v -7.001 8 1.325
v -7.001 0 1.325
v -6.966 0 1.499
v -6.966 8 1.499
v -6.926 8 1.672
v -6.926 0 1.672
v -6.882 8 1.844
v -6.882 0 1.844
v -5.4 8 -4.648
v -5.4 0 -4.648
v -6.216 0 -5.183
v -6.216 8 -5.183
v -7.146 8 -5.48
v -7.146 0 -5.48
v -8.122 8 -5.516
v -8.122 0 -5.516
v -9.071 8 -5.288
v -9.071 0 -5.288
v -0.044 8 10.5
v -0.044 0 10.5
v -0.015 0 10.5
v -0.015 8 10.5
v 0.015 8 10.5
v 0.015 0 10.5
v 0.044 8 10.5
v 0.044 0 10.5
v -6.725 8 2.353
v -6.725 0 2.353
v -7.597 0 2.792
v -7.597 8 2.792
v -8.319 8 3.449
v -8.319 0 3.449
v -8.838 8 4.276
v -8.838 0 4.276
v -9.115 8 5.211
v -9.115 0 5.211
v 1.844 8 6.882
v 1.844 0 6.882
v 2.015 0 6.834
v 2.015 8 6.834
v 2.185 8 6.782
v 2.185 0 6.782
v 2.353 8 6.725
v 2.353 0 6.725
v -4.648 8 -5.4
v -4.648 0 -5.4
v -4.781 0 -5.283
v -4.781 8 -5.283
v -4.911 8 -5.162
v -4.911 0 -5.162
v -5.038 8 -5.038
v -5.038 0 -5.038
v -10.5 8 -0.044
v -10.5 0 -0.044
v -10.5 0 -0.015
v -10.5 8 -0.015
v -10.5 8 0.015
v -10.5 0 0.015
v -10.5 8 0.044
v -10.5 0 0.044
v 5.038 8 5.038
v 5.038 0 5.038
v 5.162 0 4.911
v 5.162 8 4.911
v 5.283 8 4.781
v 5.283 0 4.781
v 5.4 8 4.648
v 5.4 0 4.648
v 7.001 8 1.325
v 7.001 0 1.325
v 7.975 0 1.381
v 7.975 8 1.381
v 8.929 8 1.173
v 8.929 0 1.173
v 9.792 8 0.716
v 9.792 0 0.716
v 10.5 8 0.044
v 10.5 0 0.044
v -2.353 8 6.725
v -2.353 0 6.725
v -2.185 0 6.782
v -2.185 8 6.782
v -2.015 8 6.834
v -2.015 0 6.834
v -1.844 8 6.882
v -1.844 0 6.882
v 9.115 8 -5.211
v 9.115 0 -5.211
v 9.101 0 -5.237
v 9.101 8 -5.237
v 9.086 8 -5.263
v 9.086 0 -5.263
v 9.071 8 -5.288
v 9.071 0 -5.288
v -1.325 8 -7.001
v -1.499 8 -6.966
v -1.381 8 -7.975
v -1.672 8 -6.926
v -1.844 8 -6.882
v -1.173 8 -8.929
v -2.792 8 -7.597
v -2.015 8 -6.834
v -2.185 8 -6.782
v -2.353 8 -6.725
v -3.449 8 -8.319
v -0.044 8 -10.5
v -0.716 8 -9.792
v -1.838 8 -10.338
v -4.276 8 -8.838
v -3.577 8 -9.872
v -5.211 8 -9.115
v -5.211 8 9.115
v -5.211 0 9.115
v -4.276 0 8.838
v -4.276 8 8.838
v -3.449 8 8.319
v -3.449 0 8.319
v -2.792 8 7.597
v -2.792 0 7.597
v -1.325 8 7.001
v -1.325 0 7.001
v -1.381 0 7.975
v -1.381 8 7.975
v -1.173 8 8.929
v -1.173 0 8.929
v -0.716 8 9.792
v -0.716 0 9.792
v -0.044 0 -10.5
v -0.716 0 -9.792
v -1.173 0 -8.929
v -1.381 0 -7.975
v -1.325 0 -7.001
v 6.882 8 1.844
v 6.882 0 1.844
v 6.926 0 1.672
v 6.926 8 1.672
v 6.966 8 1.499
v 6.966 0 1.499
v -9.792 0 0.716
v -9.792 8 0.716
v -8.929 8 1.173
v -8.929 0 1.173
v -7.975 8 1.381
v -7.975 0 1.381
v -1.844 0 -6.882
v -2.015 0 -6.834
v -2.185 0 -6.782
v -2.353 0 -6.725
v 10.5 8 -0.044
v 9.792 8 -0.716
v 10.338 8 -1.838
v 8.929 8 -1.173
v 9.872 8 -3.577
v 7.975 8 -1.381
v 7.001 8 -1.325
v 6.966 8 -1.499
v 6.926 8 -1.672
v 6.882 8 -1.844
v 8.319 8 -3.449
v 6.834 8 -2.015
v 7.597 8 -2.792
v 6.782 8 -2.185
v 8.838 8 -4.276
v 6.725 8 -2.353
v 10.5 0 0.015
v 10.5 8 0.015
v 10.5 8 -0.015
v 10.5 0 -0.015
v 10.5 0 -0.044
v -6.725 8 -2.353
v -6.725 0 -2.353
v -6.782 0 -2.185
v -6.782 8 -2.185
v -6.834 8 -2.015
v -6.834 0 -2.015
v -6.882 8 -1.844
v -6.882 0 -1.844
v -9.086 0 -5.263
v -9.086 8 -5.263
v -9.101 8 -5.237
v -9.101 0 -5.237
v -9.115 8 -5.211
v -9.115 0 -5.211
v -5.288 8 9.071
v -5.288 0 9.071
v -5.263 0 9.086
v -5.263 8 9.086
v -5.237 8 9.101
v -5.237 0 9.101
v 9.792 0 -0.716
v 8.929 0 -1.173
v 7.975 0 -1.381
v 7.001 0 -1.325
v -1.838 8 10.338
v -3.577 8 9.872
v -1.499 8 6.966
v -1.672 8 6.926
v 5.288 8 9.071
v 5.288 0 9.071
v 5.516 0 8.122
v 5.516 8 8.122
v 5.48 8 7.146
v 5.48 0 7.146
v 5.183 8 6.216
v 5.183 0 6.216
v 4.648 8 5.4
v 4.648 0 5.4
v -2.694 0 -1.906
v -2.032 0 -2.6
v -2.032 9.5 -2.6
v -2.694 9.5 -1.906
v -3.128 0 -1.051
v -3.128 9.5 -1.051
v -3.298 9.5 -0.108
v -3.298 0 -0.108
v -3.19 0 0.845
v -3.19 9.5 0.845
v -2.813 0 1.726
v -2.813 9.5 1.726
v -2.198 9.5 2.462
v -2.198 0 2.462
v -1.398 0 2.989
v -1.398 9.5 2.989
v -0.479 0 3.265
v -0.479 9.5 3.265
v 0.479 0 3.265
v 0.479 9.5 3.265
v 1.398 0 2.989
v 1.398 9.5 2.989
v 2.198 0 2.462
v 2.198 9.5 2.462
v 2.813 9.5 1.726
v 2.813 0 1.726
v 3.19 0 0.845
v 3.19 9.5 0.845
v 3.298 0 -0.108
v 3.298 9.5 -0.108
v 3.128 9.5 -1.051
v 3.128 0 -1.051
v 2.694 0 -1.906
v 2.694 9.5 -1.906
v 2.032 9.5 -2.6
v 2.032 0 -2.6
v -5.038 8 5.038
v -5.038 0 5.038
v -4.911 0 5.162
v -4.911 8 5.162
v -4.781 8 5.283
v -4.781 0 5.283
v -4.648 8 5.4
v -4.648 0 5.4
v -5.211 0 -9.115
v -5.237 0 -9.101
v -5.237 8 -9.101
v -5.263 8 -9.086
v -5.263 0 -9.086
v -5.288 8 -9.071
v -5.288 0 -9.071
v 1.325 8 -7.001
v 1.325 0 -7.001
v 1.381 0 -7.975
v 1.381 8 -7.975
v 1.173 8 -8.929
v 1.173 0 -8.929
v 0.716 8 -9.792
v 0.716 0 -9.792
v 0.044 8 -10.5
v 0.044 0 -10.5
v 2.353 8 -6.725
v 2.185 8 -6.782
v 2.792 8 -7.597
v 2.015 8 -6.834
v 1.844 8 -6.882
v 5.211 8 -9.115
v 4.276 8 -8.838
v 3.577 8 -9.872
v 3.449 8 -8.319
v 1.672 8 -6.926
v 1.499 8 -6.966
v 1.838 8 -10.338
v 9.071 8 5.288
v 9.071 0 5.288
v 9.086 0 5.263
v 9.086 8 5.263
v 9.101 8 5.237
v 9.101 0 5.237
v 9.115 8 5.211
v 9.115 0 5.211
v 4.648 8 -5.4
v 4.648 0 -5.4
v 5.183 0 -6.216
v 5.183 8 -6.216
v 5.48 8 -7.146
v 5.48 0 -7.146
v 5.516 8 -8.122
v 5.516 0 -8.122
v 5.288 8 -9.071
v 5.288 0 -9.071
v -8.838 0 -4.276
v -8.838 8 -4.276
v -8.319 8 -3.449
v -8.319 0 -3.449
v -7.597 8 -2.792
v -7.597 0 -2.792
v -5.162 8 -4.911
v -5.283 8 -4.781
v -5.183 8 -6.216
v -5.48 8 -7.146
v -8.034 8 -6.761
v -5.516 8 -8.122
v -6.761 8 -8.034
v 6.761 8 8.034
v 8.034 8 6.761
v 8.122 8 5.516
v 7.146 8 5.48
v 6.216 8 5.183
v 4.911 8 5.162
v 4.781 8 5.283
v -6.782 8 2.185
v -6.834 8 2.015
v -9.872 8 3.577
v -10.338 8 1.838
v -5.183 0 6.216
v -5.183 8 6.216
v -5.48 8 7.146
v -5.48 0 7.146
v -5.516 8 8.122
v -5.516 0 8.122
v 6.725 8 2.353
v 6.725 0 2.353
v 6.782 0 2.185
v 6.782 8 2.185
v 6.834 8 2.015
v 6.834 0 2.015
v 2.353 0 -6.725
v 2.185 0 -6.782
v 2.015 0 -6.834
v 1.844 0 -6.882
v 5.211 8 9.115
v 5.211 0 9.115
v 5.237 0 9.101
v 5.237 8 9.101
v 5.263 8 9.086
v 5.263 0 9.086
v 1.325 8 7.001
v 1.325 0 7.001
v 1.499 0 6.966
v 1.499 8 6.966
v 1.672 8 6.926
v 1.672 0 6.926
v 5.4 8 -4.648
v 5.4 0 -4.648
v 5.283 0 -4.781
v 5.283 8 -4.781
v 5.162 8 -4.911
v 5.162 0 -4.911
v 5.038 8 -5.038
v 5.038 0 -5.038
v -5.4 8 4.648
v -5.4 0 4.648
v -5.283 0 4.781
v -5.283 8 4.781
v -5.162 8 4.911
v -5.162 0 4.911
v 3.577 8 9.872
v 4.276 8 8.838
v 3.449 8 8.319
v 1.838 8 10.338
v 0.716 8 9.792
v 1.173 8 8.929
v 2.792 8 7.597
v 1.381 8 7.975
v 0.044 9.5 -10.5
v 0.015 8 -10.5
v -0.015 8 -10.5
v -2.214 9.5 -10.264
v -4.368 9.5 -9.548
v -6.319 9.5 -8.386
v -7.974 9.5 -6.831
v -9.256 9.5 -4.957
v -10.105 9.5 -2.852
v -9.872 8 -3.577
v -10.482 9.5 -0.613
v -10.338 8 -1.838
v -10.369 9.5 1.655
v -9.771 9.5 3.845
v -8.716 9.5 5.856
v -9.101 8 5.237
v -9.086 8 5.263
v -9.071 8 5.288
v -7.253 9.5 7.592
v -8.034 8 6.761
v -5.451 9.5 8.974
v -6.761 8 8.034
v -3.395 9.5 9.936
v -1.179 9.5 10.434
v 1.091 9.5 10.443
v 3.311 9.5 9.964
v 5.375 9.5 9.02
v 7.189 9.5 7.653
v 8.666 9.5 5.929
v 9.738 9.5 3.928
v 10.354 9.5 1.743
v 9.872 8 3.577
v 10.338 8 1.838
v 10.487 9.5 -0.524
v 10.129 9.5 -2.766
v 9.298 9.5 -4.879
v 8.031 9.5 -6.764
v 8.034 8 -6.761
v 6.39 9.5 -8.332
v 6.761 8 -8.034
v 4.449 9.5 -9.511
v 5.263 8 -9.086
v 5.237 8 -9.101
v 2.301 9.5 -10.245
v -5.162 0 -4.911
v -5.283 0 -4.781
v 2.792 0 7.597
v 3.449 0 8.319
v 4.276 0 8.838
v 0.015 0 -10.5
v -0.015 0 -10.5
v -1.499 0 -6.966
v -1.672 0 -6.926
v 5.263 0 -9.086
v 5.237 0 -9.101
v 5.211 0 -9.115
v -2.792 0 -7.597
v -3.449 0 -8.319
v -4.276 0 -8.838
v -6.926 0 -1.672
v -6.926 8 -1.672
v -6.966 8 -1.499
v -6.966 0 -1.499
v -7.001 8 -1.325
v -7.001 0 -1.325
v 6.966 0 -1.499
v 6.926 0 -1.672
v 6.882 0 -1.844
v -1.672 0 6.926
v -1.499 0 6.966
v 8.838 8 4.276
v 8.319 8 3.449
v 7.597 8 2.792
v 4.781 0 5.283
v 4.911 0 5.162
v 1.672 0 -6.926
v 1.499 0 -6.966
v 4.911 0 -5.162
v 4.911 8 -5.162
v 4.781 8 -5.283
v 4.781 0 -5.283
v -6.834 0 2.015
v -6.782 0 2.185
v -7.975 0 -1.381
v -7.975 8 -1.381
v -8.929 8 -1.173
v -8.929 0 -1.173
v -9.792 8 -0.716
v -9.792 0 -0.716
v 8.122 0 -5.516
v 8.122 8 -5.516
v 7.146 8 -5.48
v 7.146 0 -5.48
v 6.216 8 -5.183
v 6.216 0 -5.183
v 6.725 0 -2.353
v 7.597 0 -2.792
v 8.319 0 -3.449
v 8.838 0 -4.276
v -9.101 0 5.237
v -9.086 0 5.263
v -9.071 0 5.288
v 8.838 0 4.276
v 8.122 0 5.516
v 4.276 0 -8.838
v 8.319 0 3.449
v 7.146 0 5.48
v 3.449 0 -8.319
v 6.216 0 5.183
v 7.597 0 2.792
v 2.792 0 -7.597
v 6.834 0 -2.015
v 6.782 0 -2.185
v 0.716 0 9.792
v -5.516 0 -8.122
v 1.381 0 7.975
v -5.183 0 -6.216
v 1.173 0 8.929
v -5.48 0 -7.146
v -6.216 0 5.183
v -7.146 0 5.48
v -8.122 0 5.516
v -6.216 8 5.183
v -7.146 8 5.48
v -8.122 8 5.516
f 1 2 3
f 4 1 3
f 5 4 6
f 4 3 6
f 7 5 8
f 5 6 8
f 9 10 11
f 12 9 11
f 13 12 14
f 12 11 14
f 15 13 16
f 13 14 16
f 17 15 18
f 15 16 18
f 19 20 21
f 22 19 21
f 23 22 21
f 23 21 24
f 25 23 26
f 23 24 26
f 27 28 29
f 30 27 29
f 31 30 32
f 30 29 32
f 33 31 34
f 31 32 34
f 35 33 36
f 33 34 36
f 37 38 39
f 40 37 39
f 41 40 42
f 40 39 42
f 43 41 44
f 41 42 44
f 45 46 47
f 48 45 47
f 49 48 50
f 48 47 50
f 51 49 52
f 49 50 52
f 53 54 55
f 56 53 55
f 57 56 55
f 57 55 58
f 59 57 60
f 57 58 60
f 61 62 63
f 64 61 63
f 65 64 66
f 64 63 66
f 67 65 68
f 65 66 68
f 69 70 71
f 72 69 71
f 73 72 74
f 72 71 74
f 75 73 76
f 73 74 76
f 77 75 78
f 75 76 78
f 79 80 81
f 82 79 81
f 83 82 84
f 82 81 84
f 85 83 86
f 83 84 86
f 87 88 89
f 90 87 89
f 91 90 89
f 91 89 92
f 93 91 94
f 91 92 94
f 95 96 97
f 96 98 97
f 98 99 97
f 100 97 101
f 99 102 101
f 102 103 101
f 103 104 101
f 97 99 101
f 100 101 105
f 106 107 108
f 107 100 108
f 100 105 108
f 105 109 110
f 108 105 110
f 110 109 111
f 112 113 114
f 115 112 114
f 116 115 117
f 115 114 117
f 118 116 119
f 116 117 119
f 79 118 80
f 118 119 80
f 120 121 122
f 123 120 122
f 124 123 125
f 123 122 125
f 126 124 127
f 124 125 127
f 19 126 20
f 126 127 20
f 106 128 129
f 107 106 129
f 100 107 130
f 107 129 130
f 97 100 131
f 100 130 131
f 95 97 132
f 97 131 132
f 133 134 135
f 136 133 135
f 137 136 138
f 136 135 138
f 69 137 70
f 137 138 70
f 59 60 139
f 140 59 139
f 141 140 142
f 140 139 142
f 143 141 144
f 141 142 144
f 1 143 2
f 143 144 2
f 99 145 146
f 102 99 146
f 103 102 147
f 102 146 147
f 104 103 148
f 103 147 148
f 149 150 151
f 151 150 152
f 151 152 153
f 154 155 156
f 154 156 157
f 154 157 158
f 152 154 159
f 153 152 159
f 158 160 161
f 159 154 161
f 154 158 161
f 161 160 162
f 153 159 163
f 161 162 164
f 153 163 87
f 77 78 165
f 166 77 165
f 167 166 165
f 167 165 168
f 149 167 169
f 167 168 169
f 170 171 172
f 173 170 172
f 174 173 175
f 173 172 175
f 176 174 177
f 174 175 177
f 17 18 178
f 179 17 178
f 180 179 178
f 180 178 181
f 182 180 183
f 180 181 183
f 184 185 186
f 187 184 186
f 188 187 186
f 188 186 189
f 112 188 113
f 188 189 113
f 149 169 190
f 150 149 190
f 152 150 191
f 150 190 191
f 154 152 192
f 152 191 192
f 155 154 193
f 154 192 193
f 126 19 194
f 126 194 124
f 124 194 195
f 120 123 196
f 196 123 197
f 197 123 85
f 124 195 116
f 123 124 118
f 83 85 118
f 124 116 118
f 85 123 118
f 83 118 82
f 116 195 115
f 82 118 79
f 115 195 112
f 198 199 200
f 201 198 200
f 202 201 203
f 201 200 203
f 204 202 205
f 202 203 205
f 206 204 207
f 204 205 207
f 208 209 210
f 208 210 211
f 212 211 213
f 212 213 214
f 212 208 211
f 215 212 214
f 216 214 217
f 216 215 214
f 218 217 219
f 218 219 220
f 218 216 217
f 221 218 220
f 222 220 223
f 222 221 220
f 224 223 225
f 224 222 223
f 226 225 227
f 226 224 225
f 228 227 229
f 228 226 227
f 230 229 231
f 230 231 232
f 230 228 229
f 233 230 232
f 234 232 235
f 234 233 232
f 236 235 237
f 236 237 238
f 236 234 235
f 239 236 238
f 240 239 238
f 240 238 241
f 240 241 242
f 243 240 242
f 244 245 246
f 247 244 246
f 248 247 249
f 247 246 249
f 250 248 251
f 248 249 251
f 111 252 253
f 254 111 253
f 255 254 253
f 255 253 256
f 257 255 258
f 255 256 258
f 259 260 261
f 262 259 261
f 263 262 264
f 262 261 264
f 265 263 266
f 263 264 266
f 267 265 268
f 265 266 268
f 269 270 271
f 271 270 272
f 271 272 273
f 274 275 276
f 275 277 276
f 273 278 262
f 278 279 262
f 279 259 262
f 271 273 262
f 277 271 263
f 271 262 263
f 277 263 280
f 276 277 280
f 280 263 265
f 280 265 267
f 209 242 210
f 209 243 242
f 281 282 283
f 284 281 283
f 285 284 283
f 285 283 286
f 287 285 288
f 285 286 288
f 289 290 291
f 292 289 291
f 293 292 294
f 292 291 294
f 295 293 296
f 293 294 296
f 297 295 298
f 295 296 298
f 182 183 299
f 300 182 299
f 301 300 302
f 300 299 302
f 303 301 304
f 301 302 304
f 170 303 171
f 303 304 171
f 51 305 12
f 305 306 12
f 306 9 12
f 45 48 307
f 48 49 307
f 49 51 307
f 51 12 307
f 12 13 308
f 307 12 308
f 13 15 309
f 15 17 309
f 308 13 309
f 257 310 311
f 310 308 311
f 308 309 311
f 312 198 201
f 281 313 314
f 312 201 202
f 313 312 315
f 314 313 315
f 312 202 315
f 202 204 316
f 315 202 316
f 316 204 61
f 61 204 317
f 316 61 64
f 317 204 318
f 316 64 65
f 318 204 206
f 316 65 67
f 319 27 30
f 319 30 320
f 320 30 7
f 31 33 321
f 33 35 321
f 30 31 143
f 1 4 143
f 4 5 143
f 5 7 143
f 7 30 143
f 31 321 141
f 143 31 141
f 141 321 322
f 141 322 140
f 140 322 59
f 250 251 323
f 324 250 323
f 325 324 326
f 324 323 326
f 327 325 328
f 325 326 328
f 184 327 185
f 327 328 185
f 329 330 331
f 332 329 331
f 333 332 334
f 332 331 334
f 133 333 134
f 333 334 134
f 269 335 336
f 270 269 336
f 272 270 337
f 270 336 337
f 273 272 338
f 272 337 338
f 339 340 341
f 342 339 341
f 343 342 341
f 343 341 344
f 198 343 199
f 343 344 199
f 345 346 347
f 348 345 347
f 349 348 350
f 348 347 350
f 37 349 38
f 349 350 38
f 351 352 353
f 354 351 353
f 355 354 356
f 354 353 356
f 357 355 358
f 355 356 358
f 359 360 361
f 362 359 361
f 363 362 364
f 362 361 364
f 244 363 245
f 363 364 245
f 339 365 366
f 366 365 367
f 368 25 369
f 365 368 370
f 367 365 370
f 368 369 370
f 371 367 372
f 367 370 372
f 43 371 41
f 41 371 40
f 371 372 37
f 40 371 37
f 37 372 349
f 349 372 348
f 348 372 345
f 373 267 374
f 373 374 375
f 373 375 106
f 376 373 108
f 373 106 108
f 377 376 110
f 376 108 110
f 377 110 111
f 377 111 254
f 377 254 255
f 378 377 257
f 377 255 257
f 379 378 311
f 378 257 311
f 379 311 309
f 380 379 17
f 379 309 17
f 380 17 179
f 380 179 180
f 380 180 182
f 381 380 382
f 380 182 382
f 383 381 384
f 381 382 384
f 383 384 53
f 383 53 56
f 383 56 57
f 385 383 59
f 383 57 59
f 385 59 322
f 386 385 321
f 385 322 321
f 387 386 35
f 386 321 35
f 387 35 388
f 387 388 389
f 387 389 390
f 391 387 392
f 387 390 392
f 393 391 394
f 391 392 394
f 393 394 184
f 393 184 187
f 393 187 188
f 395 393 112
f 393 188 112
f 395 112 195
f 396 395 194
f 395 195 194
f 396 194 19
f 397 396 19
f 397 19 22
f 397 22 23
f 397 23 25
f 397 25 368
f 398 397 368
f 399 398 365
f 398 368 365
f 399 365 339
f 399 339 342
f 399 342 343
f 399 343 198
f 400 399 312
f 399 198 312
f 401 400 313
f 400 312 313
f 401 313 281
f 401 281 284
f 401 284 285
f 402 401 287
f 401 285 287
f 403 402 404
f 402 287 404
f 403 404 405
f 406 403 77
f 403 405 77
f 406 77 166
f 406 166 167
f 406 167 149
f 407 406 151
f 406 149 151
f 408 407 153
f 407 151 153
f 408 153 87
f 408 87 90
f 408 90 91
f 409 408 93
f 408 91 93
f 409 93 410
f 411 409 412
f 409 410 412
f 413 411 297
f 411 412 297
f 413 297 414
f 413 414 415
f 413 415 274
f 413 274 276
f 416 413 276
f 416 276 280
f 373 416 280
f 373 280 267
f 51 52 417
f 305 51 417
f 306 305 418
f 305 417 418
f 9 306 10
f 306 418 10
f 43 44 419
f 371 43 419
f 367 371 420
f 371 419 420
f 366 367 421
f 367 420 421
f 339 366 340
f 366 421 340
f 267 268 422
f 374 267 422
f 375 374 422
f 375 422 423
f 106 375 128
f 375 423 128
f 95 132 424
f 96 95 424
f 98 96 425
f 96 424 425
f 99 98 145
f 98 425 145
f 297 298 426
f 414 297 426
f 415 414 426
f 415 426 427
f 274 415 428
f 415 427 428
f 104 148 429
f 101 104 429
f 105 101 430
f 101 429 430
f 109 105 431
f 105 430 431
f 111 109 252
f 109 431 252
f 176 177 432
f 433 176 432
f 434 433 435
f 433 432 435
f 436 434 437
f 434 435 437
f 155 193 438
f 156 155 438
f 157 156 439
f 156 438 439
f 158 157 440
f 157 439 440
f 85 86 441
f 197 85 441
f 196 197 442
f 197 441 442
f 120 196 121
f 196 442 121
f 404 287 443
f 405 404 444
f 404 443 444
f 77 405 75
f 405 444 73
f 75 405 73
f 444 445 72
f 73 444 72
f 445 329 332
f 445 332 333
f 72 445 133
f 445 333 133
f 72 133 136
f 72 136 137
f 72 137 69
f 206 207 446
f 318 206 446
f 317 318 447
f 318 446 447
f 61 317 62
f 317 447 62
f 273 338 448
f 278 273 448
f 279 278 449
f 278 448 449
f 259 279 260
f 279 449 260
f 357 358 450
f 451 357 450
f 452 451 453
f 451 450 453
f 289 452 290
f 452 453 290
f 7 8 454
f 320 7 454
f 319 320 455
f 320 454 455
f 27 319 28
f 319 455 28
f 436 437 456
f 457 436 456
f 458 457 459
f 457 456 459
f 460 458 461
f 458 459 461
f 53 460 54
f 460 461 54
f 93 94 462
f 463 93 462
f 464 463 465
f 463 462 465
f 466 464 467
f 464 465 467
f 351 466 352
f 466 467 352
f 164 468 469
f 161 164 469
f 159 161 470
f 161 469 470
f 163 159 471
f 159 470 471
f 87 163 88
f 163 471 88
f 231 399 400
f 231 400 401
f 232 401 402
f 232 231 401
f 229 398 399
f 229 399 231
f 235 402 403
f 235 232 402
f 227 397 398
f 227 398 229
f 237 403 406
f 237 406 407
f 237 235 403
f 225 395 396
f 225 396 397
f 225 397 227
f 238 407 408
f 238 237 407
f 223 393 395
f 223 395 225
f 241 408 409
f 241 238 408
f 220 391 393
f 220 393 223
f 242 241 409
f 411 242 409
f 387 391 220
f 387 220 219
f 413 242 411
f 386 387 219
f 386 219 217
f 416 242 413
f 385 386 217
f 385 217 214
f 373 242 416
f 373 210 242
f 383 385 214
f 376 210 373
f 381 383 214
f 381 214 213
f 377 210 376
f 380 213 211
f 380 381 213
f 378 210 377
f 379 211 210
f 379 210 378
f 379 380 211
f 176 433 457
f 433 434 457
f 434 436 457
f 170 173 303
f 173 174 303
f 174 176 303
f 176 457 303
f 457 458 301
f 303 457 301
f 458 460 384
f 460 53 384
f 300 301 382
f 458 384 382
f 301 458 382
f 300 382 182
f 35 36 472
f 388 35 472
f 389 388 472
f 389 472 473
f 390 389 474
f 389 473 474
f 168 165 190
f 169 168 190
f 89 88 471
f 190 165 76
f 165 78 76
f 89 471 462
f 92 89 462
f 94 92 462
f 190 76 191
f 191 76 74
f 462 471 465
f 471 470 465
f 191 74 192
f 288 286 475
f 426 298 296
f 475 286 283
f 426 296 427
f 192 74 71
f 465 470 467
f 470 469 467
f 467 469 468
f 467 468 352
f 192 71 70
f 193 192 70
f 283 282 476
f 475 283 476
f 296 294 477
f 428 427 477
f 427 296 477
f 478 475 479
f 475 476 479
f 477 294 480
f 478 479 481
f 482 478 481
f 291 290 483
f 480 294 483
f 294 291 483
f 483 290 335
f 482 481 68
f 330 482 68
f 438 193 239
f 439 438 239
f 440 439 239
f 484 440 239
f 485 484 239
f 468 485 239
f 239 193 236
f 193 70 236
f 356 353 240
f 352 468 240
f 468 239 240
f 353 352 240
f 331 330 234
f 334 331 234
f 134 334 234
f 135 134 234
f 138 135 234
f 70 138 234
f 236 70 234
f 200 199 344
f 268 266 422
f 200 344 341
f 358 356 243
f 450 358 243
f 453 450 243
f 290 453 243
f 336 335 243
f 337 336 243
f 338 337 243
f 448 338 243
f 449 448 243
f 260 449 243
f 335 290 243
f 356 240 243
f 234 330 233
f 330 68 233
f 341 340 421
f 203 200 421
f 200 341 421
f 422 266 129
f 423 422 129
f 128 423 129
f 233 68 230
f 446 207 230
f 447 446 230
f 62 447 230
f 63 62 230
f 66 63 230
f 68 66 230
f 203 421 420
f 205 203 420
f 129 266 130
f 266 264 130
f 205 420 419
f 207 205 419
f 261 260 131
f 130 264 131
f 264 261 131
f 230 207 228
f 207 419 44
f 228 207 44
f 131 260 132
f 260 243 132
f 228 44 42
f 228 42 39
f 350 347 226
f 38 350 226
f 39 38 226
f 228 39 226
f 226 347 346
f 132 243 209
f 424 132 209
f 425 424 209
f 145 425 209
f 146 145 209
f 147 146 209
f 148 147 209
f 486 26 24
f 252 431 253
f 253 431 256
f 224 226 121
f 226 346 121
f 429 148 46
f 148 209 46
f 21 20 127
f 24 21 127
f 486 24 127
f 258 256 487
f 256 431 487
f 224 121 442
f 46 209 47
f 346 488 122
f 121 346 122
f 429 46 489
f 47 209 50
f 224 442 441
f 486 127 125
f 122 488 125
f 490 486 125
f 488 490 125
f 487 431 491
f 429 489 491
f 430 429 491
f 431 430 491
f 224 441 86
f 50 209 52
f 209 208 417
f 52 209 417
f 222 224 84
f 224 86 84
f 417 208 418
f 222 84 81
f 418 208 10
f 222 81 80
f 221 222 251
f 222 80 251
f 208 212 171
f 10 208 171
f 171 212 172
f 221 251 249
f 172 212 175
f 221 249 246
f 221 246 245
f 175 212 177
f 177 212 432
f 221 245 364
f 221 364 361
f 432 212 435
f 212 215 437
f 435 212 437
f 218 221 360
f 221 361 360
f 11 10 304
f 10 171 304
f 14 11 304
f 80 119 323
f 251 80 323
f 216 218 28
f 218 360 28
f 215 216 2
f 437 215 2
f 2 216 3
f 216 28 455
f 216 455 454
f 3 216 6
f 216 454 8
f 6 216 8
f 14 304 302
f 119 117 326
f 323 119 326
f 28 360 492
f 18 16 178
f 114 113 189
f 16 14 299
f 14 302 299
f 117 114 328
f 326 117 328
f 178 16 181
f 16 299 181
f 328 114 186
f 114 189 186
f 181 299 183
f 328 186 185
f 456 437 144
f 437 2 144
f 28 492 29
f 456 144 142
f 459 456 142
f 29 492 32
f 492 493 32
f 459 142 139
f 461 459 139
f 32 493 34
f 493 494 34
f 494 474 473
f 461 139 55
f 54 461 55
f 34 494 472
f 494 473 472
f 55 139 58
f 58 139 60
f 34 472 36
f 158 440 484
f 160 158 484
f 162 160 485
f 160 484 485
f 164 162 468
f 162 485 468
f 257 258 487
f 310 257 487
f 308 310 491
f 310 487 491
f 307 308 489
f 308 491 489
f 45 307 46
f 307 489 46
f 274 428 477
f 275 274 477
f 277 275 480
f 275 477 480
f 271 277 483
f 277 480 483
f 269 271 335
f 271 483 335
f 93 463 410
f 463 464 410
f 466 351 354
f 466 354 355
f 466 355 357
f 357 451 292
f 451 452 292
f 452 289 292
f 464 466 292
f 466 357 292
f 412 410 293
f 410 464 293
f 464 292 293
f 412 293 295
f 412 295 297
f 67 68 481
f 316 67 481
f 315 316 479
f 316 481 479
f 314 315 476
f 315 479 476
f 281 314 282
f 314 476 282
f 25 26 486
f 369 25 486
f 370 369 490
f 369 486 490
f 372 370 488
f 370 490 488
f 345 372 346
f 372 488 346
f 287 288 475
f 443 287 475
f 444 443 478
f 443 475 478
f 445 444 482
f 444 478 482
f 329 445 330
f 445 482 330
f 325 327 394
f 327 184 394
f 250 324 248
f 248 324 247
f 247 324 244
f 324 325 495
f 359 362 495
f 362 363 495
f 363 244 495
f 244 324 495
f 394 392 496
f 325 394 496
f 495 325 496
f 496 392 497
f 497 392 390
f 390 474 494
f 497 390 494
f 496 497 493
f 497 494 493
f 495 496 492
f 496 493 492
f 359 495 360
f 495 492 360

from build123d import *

# Parameters (mm, degrees)
BOSS_EXTRUDE2_DEPTH = 8
CIRPATTERN4_COUNT   = 12
CUT_EXTRUDE1_DEPTH  = 17.867127793
SKETCH8_R           = 10.5
BOSS_EXTRUDE3_DEPTH = 1.5


with BuildPart() as part:
    # Sketch6 → Boss-Extrude2 (new body)
    with BuildSketch(Plane(origin=(0, 0, 0), x_dir=(-1, 0, 0), z_dir=(0, 1, 0))):
        with BuildLine():
            Line((-1.844085696, 6.882221512), (-0.258819045, 0.965925826))
            ThreePointArc((-0.258819045, 0.965925826), (0, 1), (0.258819045, 0.965925826))
            Line((0.258819045, 0.965925826), (1.844085696, 6.882221512))
            ThreePointArc((1.844085696, 6.882221512), (1.585602155, 6.946329305), (1.324903403, 7.000732531))
            ThreePointArc((1.324903403, 7.000732531), (1.172594993, 8.928869546), (0.0444307, 10.499905995))
            ThreePointArc((0.0444307, 10.499905995), (0, 10.5), (-0.0444307, 10.499905995))
            ThreePointArc((-0.0444307, 10.499905995), (-1.172594993, 8.928869546), (-1.324903403, 7.000732531))
            ThreePointArc((-1.324903403, 7.000732531), (-1.585602155, 6.946329305), (-1.844085696, 6.882221512))
        make_face()
    boss_extrude2 = extrude(amount=BOSS_EXTRUDE2_DEPTH)

    # CirPattern4: Boss-Extrude2 ×12 about axis
    cirpattern4_axis = Axis((0, 20.85, 0), (0, -1, 0))
    for i in range(1, CIRPATTERN4_COUNT):
        add(boss_extrude2.rotate(cirpattern4_axis, i * 360 / CIRPATTERN4_COUNT))

    # Sketch7 → Cut-Extrude1 (cut, through all)
    with BuildSketch(Plane(origin=(0, 8, 0), x_dir=(1, 0, 0), z_dir=(0, 1, 0))):
        with BuildLine():
            Line((2.032240143, 2.6), (-2.032240143, 2.6))
            ThreePointArc((-2.032240143, 2.6), (0, -3.3), (2.032240143, 2.6))
        make_face()
    extrude(amount=-CUT_EXTRUDE1_DEPTH, mode=Mode.SUBTRACT)

    # Sketch8 → Boss-Extrude3 (add)
    with BuildSketch(Plane(origin=(0, 8, 0), x_dir=(1, 0, 0), z_dir=(0, 1, 0))):
        Circle(SKETCH8_R)
        with BuildLine():
            Line((2.032240143, 2.6), (-2.032240143, 2.6))
            ThreePointArc((-2.032240143, 2.6), (0, -3.3), (2.032240143, 2.6))
        make_face(mode=Mode.SUBTRACT)
    extrude(amount=BOSS_EXTRUDE3_DEPTH)


solid = part.part
